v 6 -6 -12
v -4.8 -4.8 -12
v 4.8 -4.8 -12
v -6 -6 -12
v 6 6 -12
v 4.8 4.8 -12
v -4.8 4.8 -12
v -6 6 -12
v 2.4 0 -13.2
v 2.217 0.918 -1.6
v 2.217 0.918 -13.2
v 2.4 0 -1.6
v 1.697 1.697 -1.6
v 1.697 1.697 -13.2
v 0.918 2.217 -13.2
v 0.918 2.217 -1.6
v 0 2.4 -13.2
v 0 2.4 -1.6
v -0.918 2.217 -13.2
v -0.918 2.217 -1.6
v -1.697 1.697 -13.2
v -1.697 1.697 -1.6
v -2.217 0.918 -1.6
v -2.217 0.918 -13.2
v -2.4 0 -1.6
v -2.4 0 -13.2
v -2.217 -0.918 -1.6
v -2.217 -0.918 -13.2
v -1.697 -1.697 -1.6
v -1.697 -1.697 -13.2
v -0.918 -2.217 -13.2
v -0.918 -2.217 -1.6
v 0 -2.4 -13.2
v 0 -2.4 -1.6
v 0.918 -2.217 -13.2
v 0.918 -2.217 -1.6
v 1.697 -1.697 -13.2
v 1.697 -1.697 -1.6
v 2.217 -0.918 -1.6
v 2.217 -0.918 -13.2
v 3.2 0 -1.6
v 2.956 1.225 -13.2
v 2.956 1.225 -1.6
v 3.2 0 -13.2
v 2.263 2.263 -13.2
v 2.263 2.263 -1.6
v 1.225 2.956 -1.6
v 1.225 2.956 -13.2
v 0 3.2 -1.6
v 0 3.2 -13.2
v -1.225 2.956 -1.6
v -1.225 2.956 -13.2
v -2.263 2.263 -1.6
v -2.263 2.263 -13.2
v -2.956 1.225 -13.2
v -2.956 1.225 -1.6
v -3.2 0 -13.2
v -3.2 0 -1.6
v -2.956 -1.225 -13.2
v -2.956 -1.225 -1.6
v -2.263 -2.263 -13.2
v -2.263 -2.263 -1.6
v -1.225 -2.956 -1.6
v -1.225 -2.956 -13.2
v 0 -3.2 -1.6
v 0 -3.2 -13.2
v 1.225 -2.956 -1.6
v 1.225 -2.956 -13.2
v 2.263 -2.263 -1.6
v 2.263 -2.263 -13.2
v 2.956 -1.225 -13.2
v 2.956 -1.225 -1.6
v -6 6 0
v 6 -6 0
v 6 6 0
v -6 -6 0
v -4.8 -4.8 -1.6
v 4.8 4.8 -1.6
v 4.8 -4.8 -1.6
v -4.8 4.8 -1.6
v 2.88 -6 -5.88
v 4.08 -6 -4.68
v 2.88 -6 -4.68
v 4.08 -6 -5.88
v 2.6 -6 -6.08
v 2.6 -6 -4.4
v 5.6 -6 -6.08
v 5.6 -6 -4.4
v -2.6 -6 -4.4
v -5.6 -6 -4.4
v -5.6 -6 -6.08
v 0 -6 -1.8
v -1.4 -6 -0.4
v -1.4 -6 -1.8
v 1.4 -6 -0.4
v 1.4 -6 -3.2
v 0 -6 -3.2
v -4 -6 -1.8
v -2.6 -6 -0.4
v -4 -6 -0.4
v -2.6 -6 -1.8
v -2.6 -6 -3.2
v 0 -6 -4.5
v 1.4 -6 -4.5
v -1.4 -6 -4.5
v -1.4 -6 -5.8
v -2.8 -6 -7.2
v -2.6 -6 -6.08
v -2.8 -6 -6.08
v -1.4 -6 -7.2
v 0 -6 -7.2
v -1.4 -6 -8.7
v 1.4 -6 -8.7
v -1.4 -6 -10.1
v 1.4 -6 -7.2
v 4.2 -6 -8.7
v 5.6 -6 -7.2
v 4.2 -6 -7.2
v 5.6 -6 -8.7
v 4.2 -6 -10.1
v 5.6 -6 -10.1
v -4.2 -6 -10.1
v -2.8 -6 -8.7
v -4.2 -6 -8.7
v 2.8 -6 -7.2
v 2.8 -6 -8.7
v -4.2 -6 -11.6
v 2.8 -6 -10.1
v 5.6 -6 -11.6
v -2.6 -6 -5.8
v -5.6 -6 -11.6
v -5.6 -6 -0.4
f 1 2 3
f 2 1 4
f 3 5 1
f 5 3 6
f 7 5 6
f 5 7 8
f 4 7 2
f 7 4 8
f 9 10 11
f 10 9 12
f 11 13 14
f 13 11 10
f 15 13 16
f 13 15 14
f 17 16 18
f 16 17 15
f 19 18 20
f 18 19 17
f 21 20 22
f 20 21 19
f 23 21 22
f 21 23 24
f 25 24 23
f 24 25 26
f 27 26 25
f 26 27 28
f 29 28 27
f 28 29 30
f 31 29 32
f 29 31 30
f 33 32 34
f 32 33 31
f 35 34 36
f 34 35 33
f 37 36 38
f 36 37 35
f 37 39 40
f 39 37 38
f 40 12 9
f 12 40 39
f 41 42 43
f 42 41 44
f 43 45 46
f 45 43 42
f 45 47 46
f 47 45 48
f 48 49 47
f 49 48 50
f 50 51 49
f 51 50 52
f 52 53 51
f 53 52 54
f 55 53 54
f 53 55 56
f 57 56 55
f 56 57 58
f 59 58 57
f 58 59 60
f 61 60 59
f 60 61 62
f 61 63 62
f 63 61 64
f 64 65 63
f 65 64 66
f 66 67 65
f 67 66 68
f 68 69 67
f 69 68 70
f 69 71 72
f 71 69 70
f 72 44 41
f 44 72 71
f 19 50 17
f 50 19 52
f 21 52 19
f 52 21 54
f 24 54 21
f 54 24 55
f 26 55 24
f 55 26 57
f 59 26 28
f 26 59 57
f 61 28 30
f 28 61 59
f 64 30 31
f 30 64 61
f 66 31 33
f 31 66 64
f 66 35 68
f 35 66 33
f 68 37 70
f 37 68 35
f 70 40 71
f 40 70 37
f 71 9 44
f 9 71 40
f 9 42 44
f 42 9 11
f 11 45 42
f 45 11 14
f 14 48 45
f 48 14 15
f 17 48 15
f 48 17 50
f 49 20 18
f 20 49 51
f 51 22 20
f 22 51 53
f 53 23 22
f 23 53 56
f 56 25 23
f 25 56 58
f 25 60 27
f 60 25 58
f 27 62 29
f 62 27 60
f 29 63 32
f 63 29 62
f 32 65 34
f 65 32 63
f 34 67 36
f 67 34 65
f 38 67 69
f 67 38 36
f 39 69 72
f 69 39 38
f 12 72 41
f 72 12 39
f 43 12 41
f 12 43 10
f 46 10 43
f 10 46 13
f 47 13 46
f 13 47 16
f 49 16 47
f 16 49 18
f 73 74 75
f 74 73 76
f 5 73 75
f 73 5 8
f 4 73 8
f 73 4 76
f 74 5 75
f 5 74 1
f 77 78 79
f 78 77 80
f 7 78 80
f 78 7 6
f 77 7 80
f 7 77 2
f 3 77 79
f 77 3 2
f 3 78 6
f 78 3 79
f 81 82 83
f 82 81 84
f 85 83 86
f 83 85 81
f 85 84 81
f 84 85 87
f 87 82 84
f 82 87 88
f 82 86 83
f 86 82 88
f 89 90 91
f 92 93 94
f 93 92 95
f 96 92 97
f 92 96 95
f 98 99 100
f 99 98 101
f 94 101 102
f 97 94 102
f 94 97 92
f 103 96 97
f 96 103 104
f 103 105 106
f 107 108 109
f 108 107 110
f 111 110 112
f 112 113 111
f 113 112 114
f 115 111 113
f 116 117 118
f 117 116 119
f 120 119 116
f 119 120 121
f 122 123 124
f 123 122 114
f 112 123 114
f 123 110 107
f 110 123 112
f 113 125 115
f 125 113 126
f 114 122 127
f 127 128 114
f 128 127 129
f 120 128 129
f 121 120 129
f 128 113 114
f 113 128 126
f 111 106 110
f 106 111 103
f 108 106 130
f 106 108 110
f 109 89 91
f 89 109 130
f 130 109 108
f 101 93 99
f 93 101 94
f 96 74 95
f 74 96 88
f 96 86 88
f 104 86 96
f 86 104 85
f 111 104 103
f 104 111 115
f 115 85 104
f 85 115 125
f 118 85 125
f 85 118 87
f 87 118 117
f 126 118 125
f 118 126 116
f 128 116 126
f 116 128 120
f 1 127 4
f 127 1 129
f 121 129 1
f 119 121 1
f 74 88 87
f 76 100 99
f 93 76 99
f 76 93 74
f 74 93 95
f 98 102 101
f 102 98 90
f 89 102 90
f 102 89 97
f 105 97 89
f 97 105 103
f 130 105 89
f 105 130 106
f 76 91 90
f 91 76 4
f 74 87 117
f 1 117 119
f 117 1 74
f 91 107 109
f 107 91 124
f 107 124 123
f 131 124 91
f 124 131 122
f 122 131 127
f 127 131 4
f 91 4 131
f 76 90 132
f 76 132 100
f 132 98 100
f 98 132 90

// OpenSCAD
// file: ../p/4-4ring3.scad
use <../lib.scad>
$fa=1; $fs=0.2;
function ldraw_lib__4_4ring3(realsolid=false) = [
// 0 Ring  3 x 1.0
// 0 Name: 4-4ring3.dat
// 0 Author: James Jessiman
// 0 !LDRAW_ORG Primitive UPDATE 2009-01
// 0 !LICENSE Licensed under CC BY 2.0 and CC BY 4.0 : see CAreadme.txt
// 
// 0 BFC CERTIFY CCW
  [0,"BFC","CERTIFY"],
  [0,"BFC","CCW"],
// 
// 0 !HISTORY 1998-12-15 [PTadmin] Official Update 1998-10
// 0 !HISTORY 2002-04-05 [hafhead] Added BFC statement
// 0 !HISTORY 2002-04-25 [PTadmin] Official Update 2002-02
// 0 !HISTORY 2007-06-24 [PTadmin] Header formatted for Contributor Agreement
// 0 !HISTORY 2008-07-01 [PTadmin] Official Update 2008-01
// 0 !HISTORY 2008-08-26 [cwdee] Switch polygon winding and rename
// 0 !HISTORY 2009-05-02 [PTadmin] Official Update 2009-01
// 
// 
// 4 16 -1.5308 0 3.6956 -1.1481 0 2.7717 0 0 3 0 0 4
  [4,16,-1.5308,0,3.6956,-1.1481,0,2.7717,0,0,3,0,0,4],
// 4 16 -2.8284 0 2.8284 -2.1213 0 2.1213 -1.1481 0 2.7717 -1.5308 0 3.6956
  [4,16,-2.8284,0,2.8284,-2.1213,0,2.1213,-1.1481,0,2.7717,-1.5308,0,3.6956],
// 4 16 -3.6956 0 1.5308 -2.7717 0 1.1481 -2.1213 0 2.1213 -2.8284 0 2.8284
  [4,16,-3.6956,0,1.5308,-2.7717,0,1.1481,-2.1213,0,2.1213,-2.8284,0,2.8284],
// 4 16 -4 0 0 -3 0 0 -2.7717 0 1.1481 -3.6956 0 1.5308
  [4,16,-4,0,0,-3,0,0,-2.7717,0,1.1481,-3.6956,0,1.5308],
// 4 16 -3.6956 0 -1.5308 -2.7717 0 -1.1481 -3 0 0 -4 0 0
  [4,16,-3.6956,0,-1.5308,-2.7717,0,-1.1481,-3,0,0,-4,0,0],
// 4 16 -2.8284 0 -2.8284 -2.1213 0 -2.1213 -2.7717 0 -1.1481 -3.6956 0 -1.5308
  [4,16,-2.8284,0,-2.8284,-2.1213,0,-2.1213,-2.7717,0,-1.1481,-3.6956,0,-1.5308],
// 4 16 -1.5308 0 -3.6956 -1.1481 0 -2.7717 -2.1213 0 -2.1213 -2.8284 0 -2.8284
  [4,16,-1.5308,0,-3.6956,-1.1481,0,-2.7717,-2.1213,0,-2.1213,-2.8284,0,-2.8284],
// 4 16 0 0 -4 0 0 -3 -1.1481 0 -2.7717 -1.5308 0 -3.6956
  [4,16,0,0,-4,0,0,-3,-1.1481,0,-2.7717,-1.5308,0,-3.6956],
// 4 16 1.5308 0 -3.6956 1.1481 0 -2.7717 0 0 -3 0 0 -4
  [4,16,1.5308,0,-3.6956,1.1481,0,-2.7717,0,0,-3,0,0,-4],
// 4 16 2.8284 0 -2.8284 2.1213 0 -2.1213 1.1481 0 -2.7717 1.5308 0 -3.6956
  [4,16,2.8284,0,-2.8284,2.1213,0,-2.1213,1.1481,0,-2.7717,1.5308,0,-3.6956],
// 4 16 3.6956 0 -1.5308 2.7717 0 -1.1481 2.1213 0 -2.1213 2.8284 0 -2.8284
  [4,16,3.6956,0,-1.5308,2.7717,0,-1.1481,2.1213,0,-2.1213,2.8284,0,-2.8284],
// 4 16 4 0 0 3 0 0 2.7717 0 -1.1481 3.6956 0 -1.5308
  [4,16,4,0,0,3,0,0,2.7717,0,-1.1481,3.6956,0,-1.5308],
// 4 16 3.6956 0 1.5308 2.7717 0 1.1481 3 0 0 4 0 0
  [4,16,3.6956,0,1.5308,2.7717,0,1.1481,3,0,0,4,0,0],
// 4 16 2.8284 0 2.8284 2.1213 0 2.1213 2.7717 0 1.1481 3.6956 0 1.5308
  [4,16,2.8284,0,2.8284,2.1213,0,2.1213,2.7717,0,1.1481,3.6956,0,1.5308],
// 4 16 1.5308 0 3.6956 1.1481 0 2.7717 2.1213 0 2.1213 2.8284 0 2.8284
  [4,16,1.5308,0,3.6956,1.1481,0,2.7717,2.1213,0,2.1213,2.8284,0,2.8284],
// 4 16 0 0 4 0 0 3 1.1481 0 2.7717 1.5308 0 3.6956
  [4,16,0,0,4,0,0,3,1.1481,0,2.7717,1.5308,0,3.6956],
// 0
];
module ldraw_lib__4_4ring3(step=0, col=false, unit=2/5, alt=false, line=0.2, solid=!$preview)
    makepoly(ldraw_lib__4_4ring3(solid), step=step, col=col, unit=unit, alt=alt, line=line, solid=solid);
ldraw_lib__4_4ring3(line=0.2);
// file: ../p/4-4edge.scad
use <../lib.scad>
function ldraw_lib__4_4edge() = [
// 0 Circle 1.0
// 0 Name: 4-4edge.dat
// 0 Author: James Jessiman
// 0 !LDRAW_ORG Primitive UPDATE 2017-01
// 0 !LICENSE Licensed under CC BY 2.0 and CC BY 4.0 : see CAreadme.txt
// 
// 0 BFC CERTIFY CCW
  [0,"BFC","CERTIFY"],
  [0,"BFC","CCW"],
// 
// 0 !HISTORY 1998-12-15 [PTadmin] Official Update 1998-10
// 0 !HISTORY 2005-12-28 [PTadmin] Official Update 2005-01
// 0 !HISTORY 2007-06-24 [PTadmin] Header formatted for Contributor Agreement
// 0 !HISTORY 2008-07-01 [PTadmin] Official Update 2008-01
// 0 !HISTORY 2017-01-15 [Steffen] BFCed
// 0 !HISTORY 2017-12-30 [PTadmin] Official Update 2017-01
// 
// 
// 2 24 1 0 0 0.9239 0 0.3827
  [2,24,1,0,0,0.9239,0,0.3827],
// 2 24 0.9239 0 0.3827 0.7071 0 0.7071
  [2,24,0.9239,0,0.3827,0.7071,0,0.7071],
// 2 24 0.7071 0 0.7071 0.3827 0 0.9239
  [2,24,0.7071,0,0.7071,0.3827,0,0.9239],
// 2 24 0.3827 0 0.9239 0 0 1
  [2,24,0.3827,0,0.9239,0,0,1],
// 2 24 0 0 1 -0.3827 0 0.9239
  [2,24,0,0,1,-0.3827,0,0.9239],
// 2 24 -0.3827 0 0.9239 -0.7071 0 0.7071
  [2,24,-0.3827,0,0.9239,-0.7071,0,0.7071],
// 2 24 -0.7071 0 0.7071 -0.9239 0 0.3827
  [2,24,-0.7071,0,0.7071,-0.9239,0,0.3827],
// 2 24 -0.9239 0 0.3827 -1 0 -0
  [2,24,-0.9239,0,0.3827,-1,0,-0],
// 2 24 -1 0 -0 -0.9239 0 -0.3827
  [2,24,-1,0,-0,-0.9239,0,-0.3827],
// 2 24 -0.9239 0 -0.3827 -0.7071 0 -0.7071
  [2,24,-0.9239,0,-0.3827,-0.7071,0,-0.7071],
// 2 24 -0.7071 0 -0.7071 -0.3827 0 -0.9239
  [2,24,-0.7071,0,-0.7071,-0.3827,0,-0.9239],
// 2 24 -0.3827 0 -0.9239 0 0 -1
  [2,24,-0.3827,0,-0.9239,0,0,-1],
// 2 24 0 0 -1 0.3827 0 -0.9239
  [2,24,0,0,-1,0.3827,0,-0.9239],
// 2 24 0.3827 0 -0.9239 0.7071 0 -0.7071
  [2,24,0.3827,0,-0.9239,0.7071,0,-0.7071],
// 2 24 0.7071 0 -0.7071 0.9239 0 -0.3827
  [2,24,0.7071,0,-0.7071,0.9239,0,-0.3827],
// 2 24 0.9239 0 -0.3827 1 0 0
  [2,24,0.9239,0,-0.3827,1,0,0],
];
module ldraw_lib__4_4edge(step=0, col=false, unit=2/5, alt=false, line=0.2, solid=!$preview)
    makepoly(ldraw_lib__4_4edge(), step=step, col=col, unit=unit, alt=alt, line=line, solid=solid);
ldraw_lib__4_4edge(line=0.2);
// file: ../p/4-4cyli.scad
use <../lib.scad>
$fa=1; $fs=0.2;
function ldraw_lib__4_4cyli(realsolid=false) = [
// 0 Cylinder 1.0
// 0 Name: 4-4cyli.dat
// 0 Author: James Jessiman
// 0 !LDRAW_ORG Primitive UPDATE 2005-01
// 0 !LICENSE Licensed under CC BY 2.0 and CC BY 4.0 : see CAreadme.txt
// 
// 0 BFC CERTIFY CCW
  [0,"BFC","CERTIFY"],
  [0,"BFC","CCW"],
// 
// 0 !HISTORY 1998-12-15 [PTadmin] Official Update 1998-10
// 0 !HISTORY 2002-03-23 [sbliss] Added BFC statement; merged headers from files in distributions LDraw 0.27 and Complete.
// 0 !HISTORY 2002-04-25 [PTadmin] Official Update 2002-02
// 0 !HISTORY 2004-12-14 [guyvivan] BFC CCW
// 0 !HISTORY 2005-12-28 [PTadmin] Official Update 2005-01
// 0 !HISTORY 2007-06-24 [PTadmin] Header formatted for Contributor Agreement
// 0 !HISTORY 2008-07-01 [PTadmin] Official Update 2008-01
// 
// 
// 4 16 1 1 0 0.9239 1 0.3827 0.9239 0 0.3827 1 0 0
  [4,16,1,1,0,0.9239,1,0.3827,0.9239,0,0.3827,1,0,0],
// 5 24 1 0 0 1 1 0 0.9239 0 0.3827 0.9239 0 -0.3827
  [5,24,1,0,0,1,1,0,0.9239,0,0.3827,0.9239,0,-0.3827],
// 4 16 0.9239 1 0.3827 0.7071 1 0.7071 0.7071 0 0.7071 0.9239 0 0.3827
  [4,16,0.9239,1,0.3827,0.7071,1,0.7071,0.7071,0,0.7071,0.9239,0,0.3827],
// 5 24 0.9239 0 0.3827 0.9239 1 0.3827 0.7071 0 0.7071 1 0 0
  [5,24,0.9239,0,0.3827,0.9239,1,0.3827,0.7071,0,0.7071,1,0,0],
// 4 16 0.7071 1 0.7071 0.3827 1 0.9239 0.3827 0 0.9239 0.7071 0 0.7071
  [4,16,0.7071,1,0.7071,0.3827,1,0.9239,0.3827,0,0.9239,0.7071,0,0.7071],
// 5 24 0.7071 0 0.7071 0.7071 1 0.7071 0.3827 0 0.9239 0.9239 0 0.3827
  [5,24,0.7071,0,0.7071,0.7071,1,0.7071,0.3827,0,0.9239,0.9239,0,0.3827],
// 4 16 0.3827 1 0.9239 0 1 1 0 0 1 0.3827 0 0.9239
  [4,16,0.3827,1,0.9239,0,1,1,0,0,1,0.3827,0,0.9239],
// 5 24 0.3827 0 0.9239 0.3827 1 0.9239 0 0 1 0.7071 0 0.7071
  [5,24,0.3827,0,0.9239,0.3827,1,0.9239,0,0,1,0.7071,0,0.7071],
// 4 16 0 1 1 -0.3827 1 0.9239 -0.3827 0 0.9239 0 0 1
  [4,16,0,1,1,-0.3827,1,0.9239,-0.3827,0,0.9239,0,0,1],
// 5 24 0 0 1 0 1 1 -0.3827 0 0.9239 0.3827 0 0.9239
  [5,24,0,0,1,0,1,1,-0.3827,0,0.9239,0.3827,0,0.9239],
// 4 16 -0.3827 1 0.9239 -0.7071 1 0.7071 -0.7071 0 0.7071 -0.3827 0 0.9239
  [4,16,-0.3827,1,0.9239,-0.7071,1,0.7071,-0.7071,0,0.7071,-0.3827,0,0.9239],
// 5 24 -0.3827 0 0.9239 -0.3827 1 0.9239 -0.7071 0 0.7071 0 0 1
  [5,24,-0.3827,0,0.9239,-0.3827,1,0.9239,-0.7071,0,0.7071,0,0,1],
// 4 16 -0.7071 1 0.7071 -0.9239 1 0.3827 -0.9239 0 0.3827 -0.7071 0 0.7071
  [4,16,-0.7071,1,0.7071,-0.9239,1,0.3827,-0.9239,0,0.3827,-0.7071,0,0.7071],
// 5 24 -0.7071 0 0.7071 -0.7071 1 0.7071 -0.9239 0 0.3827 -0.3827 0 0.9239
  [5,24,-0.7071,0,0.7071,-0.7071,1,0.7071,-0.9239,0,0.3827,-0.3827,0,0.9239],
// 4 16 -0.9239 1 0.3827 -1 1 0 -1 0 0 -0.9239 0 0.3827
  [4,16,-0.9239,1,0.3827,-1,1,0,-1,0,0,-0.9239,0,0.3827],
// 5 24 -0.9239 0 0.3827 -0.9239 1 0.3827 -1 0 0 -0.7071 0 0.7071
  [5,24,-0.9239,0,0.3827,-0.9239,1,0.3827,-1,0,0,-0.7071,0,0.7071],
// 4 16 -1 1 0 -0.9239 1 -0.3827 -0.9239 0 -0.3827 -1 0 0
  [4,16,-1,1,0,-0.9239,1,-0.3827,-0.9239,0,-0.3827,-1,0,0],
// 5 24 -1 0 0 -1 1 0 -0.9239 0 -0.3827 -0.9239 0 0.3827
  [5,24,-1,0,0,-1,1,0,-0.9239,0,-0.3827,-0.9239,0,0.3827],
// 4 16 -0.9239 1 -0.3827 -0.7071 1 -0.7071 -0.7071 0 -0.7071 -0.9239 0 -0.3827
  [4,16,-0.9239,1,-0.3827,-0.7071,1,-0.7071,-0.7071,0,-0.7071,-0.9239,0,-0.3827],
// 5 24 -0.9239 0 -0.3827 -0.9239 1 -0.3827 -0.7071 0 -0.7071 -1 0 0
  [5,24,-0.9239,0,-0.3827,-0.9239,1,-0.3827,-0.7071,0,-0.7071,-1,0,0],
// 4 16 -0.7071 1 -0.7071 -0.3827 1 -0.9239 -0.3827 0 -0.9239 -0.7071 0 -0.7071
  [4,16,-0.7071,1,-0.7071,-0.3827,1,-0.9239,-0.3827,0,-0.9239,-0.7071,0,-0.7071],
// 5 24 -0.7071 0 -0.7071 -0.7071 1 -0.7071 -0.3827 0 -0.9239 -0.9239 0 -0.3827
  [5,24,-0.7071,0,-0.7071,-0.7071,1,-0.7071,-0.3827,0,-0.9239,-0.9239,0,-0.3827],
// 4 16 -0.3827 1 -0.9239 0 1 -1 0 0 -1 -0.3827 0 -0.9239
  [4,16,-0.3827,1,-0.9239,0,1,-1,0,0,-1,-0.3827,0,-0.9239],
// 5 24 -0.3827 0 -0.9239 -0.3827 1 -0.9239 0 0 -1 -0.7071 0 -0.7071
  [5,24,-0.3827,0,-0.9239,-0.3827,1,-0.9239,0,0,-1,-0.7071,0,-0.7071],
// 4 16 0 1 -1 0.3827 1 -0.9239 0.3827 0 -0.9239 0 0 -1
  [4,16,0,1,-1,0.3827,1,-0.9239,0.3827,0,-0.9239,0,0,-1],
// 5 24 0 0 -1 0 1 -1 0.3827 0 -0.9239 -0.3827 0 -0.9239
  [5,24,0,0,-1,0,1,-1,0.3827,0,-0.9239,-0.3827,0,-0.9239],
// 4 16 0.3827 1 -0.9239 0.7071 1 -0.7071 0.7071 0 -0.7071 0.3827 0 -0.9239
  [4,16,0.3827,1,-0.9239,0.7071,1,-0.7071,0.7071,0,-0.7071,0.3827,0,-0.9239],
// 5 24 0.3827 0 -0.9239 0.3827 1 -0.9239 0.7071 0 -0.7071 0 0 -1
  [5,24,0.3827,0,-0.9239,0.3827,1,-0.9239,0.7071,0,-0.7071,0,0,-1],
// 4 16 0.7071 1 -0.7071 0.9239 1 -0.3827 0.9239 0 -0.3827 0.7071 0 -0.7071
  [4,16,0.7071,1,-0.7071,0.9239,1,-0.3827,0.9239,0,-0.3827,0.7071,0,-0.7071],
// 5 24 0.7071 0 -0.7071 0.7071 1 -0.7071 0.9239 0 -0.3827 0.3827 0 -0.9239
  [5,24,0.7071,0,-0.7071,0.7071,1,-0.7071,0.9239,0,-0.3827,0.3827,0,-0.9239],
// 4 16 0.9239 1 -0.3827 1 1 0 1 0 0 0.9239 0 -0.3827
  [4,16,0.9239,1,-0.3827,1,1,0,1,0,0,0.9239,0,-0.3827],
// 5 24 0.9239 0 -0.3827 0.9239 1 -0.3827 1 0 0 0.7071 0 -0.7071
  [5,24,0.9239,0,-0.3827,0.9239,1,-0.3827,1,0,0,0.7071,0,-0.7071],
// 0
];
module ldraw_lib__4_4cyli(step=0, col=false, unit=2/5, alt=false, line=0.2, solid=!$preview)
    makepoly(ldraw_lib__4_4cyli(solid), step=step, col=col, unit=unit, alt=alt, line=line, solid=solid);
ldraw_lib__4_4cyli(line=0.2);
// file: ../p/stud4.scad
use <../lib.scad>
use <4-4cyli.scad>
use <4-4edge.scad>
use <4-4ring3.scad>
function ldraw_lib__stud4() = [
// 0 Stud Tube Open
// 0 Name: stud4.dat
// 0 Author: James Jessiman
// 0 !LDRAW_ORG Primitive UPDATE 2009-02
// 0 !LICENSE Licensed under CC BY 4.0 : see CAreadme.txt
// 
// 0 BFC CERTIFY CCW
  [0,"BFC","CERTIFY"],
  [0,"BFC","CCW"],
// 
// 0 !HISTORY 1999-07-05 [PTadmin] Official Update 1999-05
// 0 !HISTORY 2002-04-04 [sbliss] Modified for BFC compliance
// 0 !HISTORY 2002-04-25 [PTadmin] Official Update 2002-02
// 0 !HISTORY 2007-06-24 [PTadmin] Header formatted for Contributor Agreement
// 0 !HISTORY 2008-07-01 [PTadmin] Official Update 2008-01
// 0 !HISTORY 2009-06-21 [cwdee] Update ring references to 4-4ring
// 0 !HISTORY 2009-09-03 [PTadmin] Official Update 2009-02
// 
// 
// 1 16 0 -4 0 6 0 0 0 1 0 0 0 6 4-4edge.dat
  [1,16,0,-4,0,6,0,0,0,1,0,0,0,6, ldraw_lib__4_4edge()],
// 1 16 0 -4 0 8 0 0 0 1 0 0 0 8 4-4edge.dat
  [1,16,0,-4,0,8,0,0,0,1,0,0,0,8, ldraw_lib__4_4edge()],
// 1 16 0 0 0 6 0 0 0 1 0 0 0 6 4-4edge.dat
  [1,16,0,0,0,6,0,0,0,1,0,0,0,6, ldraw_lib__4_4edge()],
// 1 16 0 0 0 8 0 0 0 1 0 0 0 8 4-4edge.dat
  [1,16,0,0,0,8,0,0,0,1,0,0,0,8, ldraw_lib__4_4edge()],
// 0 BFC INVERTNEXT
  [0,"BFC","INVERTNEXT"],
// 1 16 0 -4 0 6 0 0 0 4 0 0 0 6 4-4cyli.dat
  [1,16,0,-4,0,6,0,0,0,4,0,0,0,6, ldraw_lib__4_4cyli()],
// 1 16 0 -4 0 8 0 0 0 4 0 0 0 8 4-4cyli.dat
  [1,16,0,-4,0,8,0,0,0,4,0,0,0,8, ldraw_lib__4_4cyli()],
// 1 16 0 -4 0 2 0 0 0 1 0 0 0 2 4-4ring3.dat
  [1,16,0,-4,0,2,0,0,0,1,0,0,0,2, ldraw_lib__4_4ring3()],
  [-1,16,0,0,0,2,0,0,0,-1,0,0,0,2, ldraw_lib__4_4ring3()],
// 0
];
module ldraw_lib__stud4(step=0, col=false, unit=2/5, alt=false, line=0.2, solid=!$preview)
    makepoly(ldraw_lib__stud4(), step=step, col=col, unit=unit, alt=alt, line=line, solid=solid);
ldraw_lib__stud4(line=0.2);
// file: ../p/box5.scad
use <../lib.scad>
function ldraw_lib__box5() = [
// 0 Box with 5 Faces and All Edges
// 0 Name: box5.dat
// 0 Author: James Jessiman
// 0 !LDRAW_ORG Primitive UPDATE 2012-01
// 0 !LICENSE Licensed under CC BY 2.0 and CC BY 4.0 : see CAreadme.txt
// 
// 0 BFC CERTIFY CCW
  [0,"BFC","CERTIFY"],
  [0,"BFC","CCW"],
// 
// 0 !HISTORY 2002-04-03 [sbliss] Modified for BFC compliance
// 0 !HISTORY 2002-04-25 [PTadmin] Official Update 2002-02
// 0 !HISTORY 2007-06-24 [PTadmin] Header formatted for Contributor Agreement
// 0 !HISTORY 2008-07-01 [PTadmin] Official Update 2008-01
// 0 !HISTORY 2012-02-16 [Philo] Changed to CCW
// 0 !HISTORY 2012-03-30 [PTadmin] Official Update 2012-01
// 
// 
// 2 24 1 1 1 -1 1 1
  [2,24,1,1,1,-1,1,1],
// 2 24 -1 1 1 -1 1 -1
  [2,24,-1,1,1,-1,1,-1],
// 2 24 -1 1 -1 1 1 -1
  [2,24,-1,1,-1,1,1,-1],
// 2 24 1 1 -1 1 1 1
  [2,24,1,1,-1,1,1,1],
// 2 24 1 0 1 -1 0 1
  [2,24,1,0,1,-1,0,1],
// 2 24 -1 0 1 -1 0 -1
  [2,24,-1,0,1,-1,0,-1],
// 2 24 -1 0 -1 1 0 -1
  [2,24,-1,0,-1,1,0,-1],
// 2 24 1 0 -1 1 0 1
  [2,24,1,0,-1,1,0,1],
// 2 24 1 0 1 1 1 1
  [2,24,1,0,1,1,1,1],
// 2 24 -1 0 1 -1 1 1
  [2,24,-1,0,1,-1,1,1],
// 2 24 1 0 -1 1 1 -1
  [2,24,1,0,-1,1,1,-1],
// 2 24 -1 0 -1 -1 1 -1
  [2,24,-1,0,-1,-1,1,-1],
// 4 16 -1 1 1 1 1 1 1 1 -1 -1 1 -1
  [4,16,-1,1,1,1,1,1,1,1,-1,-1,1,-1],
// 4 16 -1 1 1 -1 0 1 1 0 1 1 1 1
  [4,16,-1,1,1,-1,0,1,1,0,1,1,1,1],
// 4 16 -1 1 -1 -1 0 -1 -1 0 1 -1 1 1
  [4,16,-1,1,-1,-1,0,-1,-1,0,1,-1,1,1],
// 4 16 1 1 -1 1 0 -1 -1 0 -1 -1 1 -1
  [4,16,1,1,-1,1,0,-1,-1,0,-1,-1,1,-1],
// 4 16 1 1 1 1 0 1 1 0 -1 1 1 -1
  [4,16,1,1,1,1,0,1,1,0,-1,1,1,-1],
];
makepoly(ldraw_lib__box5(), line=0.2);
// file: ../p/box4t.scad
use <../lib.scad>
function ldraw_lib__box4t() = [
// 0 Box with 4 Adjacent Faces and All Edges
// 0 Name: box4t.dat
// 0 Author: Tore Eriksson [Tore_Eriksson]
// 0 !LDRAW_ORG Primitive UPDATE 2003-02
// 0 !LICENSE Licensed under CC BY 2.0 and CC BY 4.0 : see CAreadme.txt
// 
// 0 BFC CERTIFY CCW
  [0,"BFC","CERTIFY"],
  [0,"BFC","CCW"],
// 
// 0 !HISTORY 1997-09-29 [PTadmin] Official Update 1997-15
// 0 !HISTORY 2002-08-31 [izanette] Modified with WINDZ for BFC compliance
// 0 !HISTORY 2003-08-01 [PTadmin] Official Update 2003-02
// 0 !HISTORY 2007-06-24 [PTadmin] Header formatted for Contributor Agreement
// 0 !HISTORY 2008-07-01 [PTadmin] Official Update 2008-01
// 
// 
// 2 24 1 1 1 -1 1 1
  [2,24,1,1,1,-1,1,1],
// 2 24 -1 1 1 -1 1 -1
  [2,24,-1,1,1,-1,1,-1],
// 2 24 -1 1 -1 1 1 -1
  [2,24,-1,1,-1,1,1,-1],
// 2 24 1 1 -1 1 1 1
  [2,24,1,1,-1,1,1,1],
// 2 24 1 0 1 -1 0 1
  [2,24,1,0,1,-1,0,1],
// 2 24 -1 0 1 -1 0 -1
  [2,24,-1,0,1,-1,0,-1],
// 2 24 -1 0 -1 1 0 -1
  [2,24,-1,0,-1,1,0,-1],
// 2 24 1 0 -1 1 0 1
  [2,24,1,0,-1,1,0,1],
// 2 24 1 0 1 1 1 1
  [2,24,1,0,1,1,1,1],
// 2 24 -1 0 1 -1 1 1
  [2,24,-1,0,1,-1,1,1],
// 2 24 1 0 -1 1 1 -1
  [2,24,1,0,-1,1,1,-1],
// 2 24 -1 0 -1 -1 1 -1
  [2,24,-1,0,-1,-1,1,-1],
// 4 16 1 1 1 1 1 -1 -1 1 -1 -1 1 1
  [4,16,1,1,1,1,1,-1,-1,1,-1,-1,1,1],
// 4 16 1 1 1 -1 1 1 -1 0 1 1 0 1
  [4,16,1,1,1,-1,1,1,-1,0,1,1,0,1],
// 4 16 -1 1 1 -1 1 -1 -1 0 -1 -1 0 1
  [4,16,-1,1,1,-1,1,-1,-1,0,-1,-1,0,1],
// 0 4 16 -1 1 -1 -1 0 -1 1 0 -1 1 1 -1
// 4 16 1 1 -1 1 1 1 1 0 1 1 0 -1
  [4,16,1,1,-1,1,1,1,1,0,1,1,0,-1],
// 0
];
makepoly(ldraw_lib__box4t(), line=0.2);
// file: s/19729s01.scad
use <../../lib.scad>
use <../../p/box4t.scad>
use <../../p/box5.scad>
use <../../p/stud4.scad>
function ldraw_lib__s__19729s01() = [
// 0 ~Minifig Head Cuboid without Front Surface
// 0 Name: s\19729s01.dat
// 0 Author: Mark Kennedy [mkennedy]
// 0 !LDRAW_ORG Subpart UPDATE 2016-01
// 0 !LICENSE Licensed under CC BY 4.0 : see CAreadme.txt
// 
// 0 BFC CERTIFY CW
  [0,"BFC","CERTIFY"],
  [0,"BFC","CW"],
// 
// 0 !HISTORY 2016-03-18 {LEGO Digital Designer} Original part shape
// 0 !HISTORY 2016-03-28 [mkennedy] Primitive substitution
// 0 !HISTORY 2016-12-31 [PTadmin] Official Update 2016-01
// 
// 
// 4 16 15 30 -15 12 30 -12 -12 30 -12 -15 30 -15
  [4,16,15,30,-15,12,30,-12,-12,30,-12,-15,30,-15],
// 4 16 15 30 15 12 30 12 12 30 -12 15 30 -15
  [4,16,15,30,15,12,30,12,12,30,-12,15,30,-15],
// 4 16 -15 30 15 -12 30 12 12 30 12 15 30 15
  [4,16,-15,30,15,-12,30,12,12,30,12,15,30,15],
// 4 16 -15 30 -15 -12 30 -12 -12 30 12 -15 30 15
  [4,16,-15,30,-15,-12,30,-12,-12,30,12,-15,30,15],
// 0
// 1 16 0 4 0 1 0 0 0 -7.25 0 0 0 1 stud4.dat
  [1,16,0,4,0,1,0,0,0,-7.25,0,0,0,1, ldraw_lib__stud4()],
// 1 16 0 30 0 15 0 0 0 -30 0 0 0 15 box4t.dat
  [1,16,0,30,0,15,0,0,0,-30,0,0,0,15, ldraw_lib__box4t()],
// 0 BFC INVERTNEXT
  [0,"BFC","INVERTNEXT"],
// 1 16 0 30 0 12 0 0 0 -26 0 0 0 12 box5.dat
  [1,16,0,30,0,12,0,0,0,-26,0,0,0,12, ldraw_lib__box5()],
// 
];
module ldraw_lib__s__19729s01(step=0, col=false, unit=2/5, alt=false, line=0.2, solid=!$preview)
    makepoly(ldraw_lib__s__19729s01(), step=step, col=col, unit=unit, alt=alt, line=line, solid=solid);
ldraw_lib__s__19729s01(line=0.2);
// main file
use <../lib.scad>
use <s/19729s01.scad>
function ldraw_lib__19729p07() = [
// 0 Minifig Head Cuboid with Minecraft Zombie Pigman Pattern
// 0 Name: 19729p07.dat
// 0 Author: Evert-Jan Boer [ejboer]
// 0 !LDRAW_ORG Part UPDATE 2024-04
// 0 !LICENSE Licensed under CC BY 4.0 : see CAreadme.txt
// 
// 0 BFC CERTIFY CCW
  [0,"BFC","CERTIFY"],
  [0,"BFC","CCW"],
// 
// 0 !KEYWORDS Bricklink 19729pb008, Brickowl 206684, Rebrickable 19729pr0009
// 0 !KEYWORDS Set 21122, Set 21130, Set 21139
// 
// 0 !HISTORY 2024-05-28 [OrionP] Official Update 2024-04
// 
// 
// 1 16 0 0 0 1 0 0 0 1 0 0 0 1 s\19729s01.dat
  [1,16,0,0,0,1,0,0,0,1,0,0,0,1, ldraw_lib__s__19729s01()],
// 4 15 10.2 14.7 -15 10.2 11.7 -15 7.2 11.7 -15 7.2 14.7 -15
  [4,15,10.2,14.7,-15,10.2,11.7,-15,7.2,11.7,-15,7.2,14.7,-15],
// 4 0 6.5 15.2 -15 7.2 14.7 -15 7.2 11.7 -15 6.5 11 -15
  [4,0,6.5,15.2,-15,7.2,14.7,-15,7.2,11.7,-15,6.5,11,-15],
// 4 0 14 15.2 -15 10.2 14.7 -15 7.2 14.7 -15 6.5 15.2 -15
  [4,0,14,15.2,-15,10.2,14.7,-15,7.2,14.7,-15,6.5,15.2,-15],
// 4 0 10.2 14.7 -15 14 15.2 -15 14 11 -15 10.2 11.7 -15
  [4,0,10.2,14.7,-15,14,15.2,-15,14,11,-15,10.2,11.7,-15],
// 4 0 6.5 11 -15 7.2 11.7 -15 10.2 11.7 -15 14 11 -15
  [4,0,6.5,11,-15,7.2,11.7,-15,10.2,11.7,-15,14,11,-15],
// 3 0 -6.5 11 -15 -14 11 -15 -14 15.2 -15
  [3,0,-6.5,11,-15,-14,11,-15,-14,15.2,-15],
// 4 288 -3.5 4.5 -15 0 4.5 -15 3.5 1 -15 -3.5 1 -15
  [4,288,-3.5,4.5,-15,0,4.5,-15,3.5,1,-15,-3.5,1,-15],
// 4 288 3.5 8 -15 3.5 1 -15 0 4.5 -15 0 8 -15
  [4,288,3.5,8,-15,3.5,1,-15,0,4.5,-15,0,8,-15],
// 4 2 -10 4.5 -15 -6.5 4.5 -15 -6.5 1 -15 -10 1 -15
  [4,2,-10,4.5,-15,-6.5,4.5,-15,-6.5,1,-15,-10,1,-15],
// 3 2 -3.5 4.5 -15 -6.5 4.5 -15 -6.5 8 -15
  [3,2,-3.5,4.5,-15,-6.5,4.5,-15,-6.5,8,-15],
// 4 2 0 8 -15 0 4.5 -15 -3.5 4.5 -15 -6.5 8 -15
  [4,2,0,8,-15,0,4.5,-15,-3.5,4.5,-15,-6.5,8,-15],
// 4 2 3.5 11.25 -15 3.5 8 -15 0 8 -15 0 11.25 -15
  [4,2,3.5,11.25,-15,3.5,8,-15,0,8,-15,0,11.25,-15],
// 3 2 0 11.25 -15 -3.5 11.25 -15 -3.5 14.5 -15
  [3,2,0,11.25,-15,-3.5,11.25,-15,-3.5,14.5,-15],
// 4 2 -7 15.2 -15 -7 18 -15 -3.5 18 -15 -6.5 15.2 -15
  [4,2,-7,15.2,-15,-7,18,-15,-3.5,18,-15,-6.5,15.2,-15],
// 3 2 0 18 -15 -3.5 18 -15 -3.5 21.75 -15
  [3,2,0,18,-15,-3.5,18,-15,-3.5,21.75,-15],
// 4 2 -3.5 25.25 -15 3.5 21.75 -15 0 18 -15 -3.5 21.75 -15
  [4,2,-3.5,25.25,-15,3.5,21.75,-15,0,18,-15,-3.5,21.75,-15],
// 3 2 3.5 18 -15 0 18 -15 3.5 21.75 -15
  [3,2,3.5,18,-15,0,18,-15,3.5,21.75,-15],
// 4 2 14 21.75 -15 14 18 -15 10.5 18 -15 10.5 21.75 -15
  [4,2,14,21.75,-15,14,18,-15,10.5,18,-15,10.5,21.75,-15],
// 4 288 10.5 21.75 -15 10.5 25.25 -15 14 25.25 -15 14 21.75 -15
  [4,288,10.5,21.75,-15,10.5,25.25,-15,14,25.25,-15,14,21.75,-15],
// 4 288 -3.5 25.25 -15 -7 21.75 -15 -10.5 21.75 -15 -10.5 25.25 -15
  [4,288,-3.5,25.25,-15,-7,21.75,-15,-10.5,21.75,-15,-10.5,25.25,-15],
// 3 288 -3.5 21.75 -15 -7 21.75 -15 -3.5 25.25 -15
  [3,288,-3.5,21.75,-15,-7,21.75,-15,-3.5,25.25,-15],
// 4 70 -7 18 -15 -7 21.75 -15 -3.5 21.75 -15 -3.5 18 -15
  [4,70,-7,18,-15,-7,21.75,-15,-3.5,21.75,-15,-3.5,18,-15],
// 4 70 3.5 21.75 -15 7 21.75 -15 7 18 -15 3.5 18 -15
  [4,70,3.5,21.75,-15,7,21.75,-15,7,18,-15,3.5,18,-15],
// 3 2 -3.5 25.25 -15 -10.5 25.25 -15 -10.5 29 -15
  [3,2,-3.5,25.25,-15,-10.5,25.25,-15,-10.5,29,-15],
// 4 2 -10.5 29 -15 14 29 -15 7 25.25 -15 -3.5 25.25 -15
  [4,2,-10.5,29,-15,14,29,-15,7,25.25,-15,-3.5,25.25,-15],
// 3 2 10.5 25.25 -15 7 25.25 -15 14 29 -15
  [3,2,10.5,25.25,-15,7,25.25,-15,14,29,-15],
// 3 2 14 25.25 -15 10.5 25.25 -15 14 29 -15
  [3,2,14,25.25,-15,10.5,25.25,-15,14,29,-15],
// 4 2 -3.5 25.25 -15 7 25.25 -15 7 21.75 -15 3.5 21.75 -15
  [4,2,-3.5,25.25,-15,7,25.25,-15,7,21.75,-15,3.5,21.75,-15],
// 4 2 -3.5 18 -15 0 18 -15 0 11.25 -15 -3.5 14.5 -15
  [4,2,-3.5,18,-15,0,18,-15,0,11.25,-15,-3.5,14.5,-15],
// 4 2 -3.5 18 -15 -3.5 14.5 -15 -6.5 14.5 -15 -6.5 15.2 -15
  [4,2,-3.5,18,-15,-3.5,14.5,-15,-6.5,14.5,-15,-6.5,15.2,-15],
// 4 0 -7 15.2 -15 -6.5 14.5 -15 -6.5 11 -15 -14 15.2 -15
  [4,0,-7,15.2,-15,-6.5,14.5,-15,-6.5,11,-15,-14,15.2,-15],
// 3 0 -6.5 14.5 -15 -7 15.2 -15 -6.5 15.2 -15
  [3,0,-6.5,14.5,-15,-7,15.2,-15,-6.5,15.2,-15],
// 4 15 -3.5 4.5 -15 -3.5 1 -15 -6.5 1 -15 -6.5 4.5 -15
  [4,15,-3.5,4.5,-15,-3.5,1,-15,-6.5,1,-15,-6.5,4.5,-15],
// 4 16 3.5 1 -15 3.5 8 -15 14 11 -15 15 0 -15
  [4,16,3.5,1,-15,3.5,8,-15,14,11,-15,15,0,-15],
// 3 16 3.5 8 -15 6.5 11 -15 14 11 -15
  [3,16,3.5,8,-15,6.5,11,-15,14,11,-15],
// 4 16 6.5 15.2 -15 6.5 11 -15 3.5 8 -15 3.5 11.25 -15
  [4,16,6.5,15.2,-15,6.5,11,-15,3.5,8,-15,3.5,11.25,-15],
// 4 16 0 18 -15 3.5 18 -15 3.5 11.25 -15 0 11.25 -15
  [4,16,0,18,-15,3.5,18,-15,3.5,11.25,-15,0,11.25,-15],
// 4 16 3.5 11.25 -15 3.5 18 -15 7 18 -15 6.5 15.2 -15
  [4,16,3.5,11.25,-15,3.5,18,-15,7,18,-15,6.5,15.2,-15],
// 4 16 7 18 -15 10.5 18 -15 14 15.2 -15 6.5 15.2 -15
  [4,16,7,18,-15,10.5,18,-15,14,15.2,-15,6.5,15.2,-15],
// 3 16 14 15.2 -15 10.5 18 -15 14 18 -15
  [3,16,14,15.2,-15,10.5,18,-15,14,18,-15],
// 4 16 10.5 21.75 -15 10.5 18 -15 7 18 -15 7 21.75 -15
  [4,16,10.5,21.75,-15,10.5,18,-15,7,18,-15,7,21.75,-15],
// 4 16 10.5 25.25 -15 10.5 21.75 -15 7 21.75 -15 7 25.25 -15
  [4,16,10.5,25.25,-15,10.5,21.75,-15,7,21.75,-15,7,25.25,-15],
// 4 16 -15 30 -15 15 30 -15 14 29 -15 -10.5 29 -15
  [4,16,-15,30,-15,15,30,-15,14,29,-15,-10.5,29,-15],
// 3 16 14 25.25 -15 14 29 -15 15 30 -15
  [3,16,14,25.25,-15,14,29,-15,15,30,-15],
// 3 16 14 21.75 -15 14 25.25 -15 15 30 -15
  [3,16,14,21.75,-15,14,25.25,-15,15,30,-15],
// 3 16 15 0 -15 14 11 -15 14 15.2 -15
  [3,16,15,0,-15,14,11,-15,14,15.2,-15],
// 3 16 -15 0 -15 -10 1 -15 -6.5 1 -15
  [3,16,-15,0,-15,-10,1,-15,-6.5,1,-15],
// 4 16 15 0 -15 -15 0 -15 -6.5 1 -15 -3.5 1 -15
  [4,16,15,0,-15,-15,0,-15,-6.5,1,-15,-3.5,1,-15],
// 3 16 15 0 -15 -3.5 1 -15 3.5 1 -15
  [3,16,15,0,-15,-3.5,1,-15,3.5,1,-15],
// 4 15 -6.5 4.5 -15 -10 4.5 -15 -14 11 -15 -6.5 8 -15
  [4,15,-6.5,4.5,-15,-10,4.5,-15,-14,11,-15,-6.5,8,-15],
// 4 15 -14 11 -15 -6.5 11 -15 0 8 -15 -6.5 8 -15
  [4,15,-14,11,-15,-6.5,11,-15,0,8,-15,-6.5,8,-15],
// 4 15 0 11.25 -15 0 8 -15 -6.5 11 -15 -3.5 11.25 -15
  [4,15,0,11.25,-15,0,8,-15,-6.5,11,-15,-3.5,11.25,-15],
// 4 15 -3.5 14.5 -15 -3.5 11.25 -15 -6.5 11 -15 -6.5 14.5 -15
  [4,15,-3.5,14.5,-15,-3.5,11.25,-15,-6.5,11,-15,-6.5,14.5,-15],
// 4 16 -14 11 -15 -15 0 -15 -15 30 -15 -14 15.2 -15
  [4,16,-14,11,-15,-15,0,-15,-15,30,-15,-14,15.2,-15],
// 3 16 15 0 -15 14 15.2 -15 14 18 -15
  [3,16,15,0,-15,14,15.2,-15,14,18,-15],
// 4 16 14 21.75 -15 15 30 -15 15 0 -15 14 18 -15
  [4,16,14,21.75,-15,15,30,-15,15,0,-15,14,18,-15],
// 4 15 -7 15.2 -15 -14 15.2 -15 -10.5 21.75 -15 -7 18 -15
  [4,15,-7,15.2,-15,-14,15.2,-15,-10.5,21.75,-15,-7,18,-15],
// 3 15 -7 18 -15 -10.5 21.75 -15 -7 21.75 -15
  [3,15,-7,18,-15,-10.5,21.75,-15,-7,21.75,-15],
// 4 15 -14 29 -15 -10.5 25.25 -15 -10.5 21.75 -15 -14 15.2 -15
  [4,15,-14,29,-15,-10.5,25.25,-15,-10.5,21.75,-15,-14,15.2,-15],
// 3 15 -10.5 25.25 -15 -14 29 -15 -10.5 29 -15
  [3,15,-10.5,25.25,-15,-14,29,-15,-10.5,29,-15],
// 3 16 -10.5 29 -15 -14 29 -15 -15 30 -15
  [3,16,-10.5,29,-15,-14,29,-15,-15,30,-15],
// 3 16 -14 15.2 -15 -15 30 -15 -14 29 -15
  [3,16,-14,15.2,-15,-15,30,-15,-14,29,-15],
// 3 16 -15 0 -15 -14 11 -15 -14 1 -15
  [3,16,-15,0,-15,-14,11,-15,-14,1,-15],
// 3 16 -15 0 -15 -14 1 -15 -10 1 -15
  [3,16,-15,0,-15,-14,1,-15,-10,1,-15],
// 4 15 -10 1 -15 -14 1 -15 -14 11 -15 -10 4.5 -15
  [4,15,-10,1,-15,-14,1,-15,-14,11,-15,-10,4.5,-15],
];
module ldraw_lib__19729p07(step=0, col=false, unit=2/5, alt=false, line=0.2, solid=!$preview)
    makepoly(ldraw_lib__19729p07(), step=step, col=col, unit=unit, alt=alt, line=line, solid=solid);
ldraw_lib__19729p07(line=0.2);
